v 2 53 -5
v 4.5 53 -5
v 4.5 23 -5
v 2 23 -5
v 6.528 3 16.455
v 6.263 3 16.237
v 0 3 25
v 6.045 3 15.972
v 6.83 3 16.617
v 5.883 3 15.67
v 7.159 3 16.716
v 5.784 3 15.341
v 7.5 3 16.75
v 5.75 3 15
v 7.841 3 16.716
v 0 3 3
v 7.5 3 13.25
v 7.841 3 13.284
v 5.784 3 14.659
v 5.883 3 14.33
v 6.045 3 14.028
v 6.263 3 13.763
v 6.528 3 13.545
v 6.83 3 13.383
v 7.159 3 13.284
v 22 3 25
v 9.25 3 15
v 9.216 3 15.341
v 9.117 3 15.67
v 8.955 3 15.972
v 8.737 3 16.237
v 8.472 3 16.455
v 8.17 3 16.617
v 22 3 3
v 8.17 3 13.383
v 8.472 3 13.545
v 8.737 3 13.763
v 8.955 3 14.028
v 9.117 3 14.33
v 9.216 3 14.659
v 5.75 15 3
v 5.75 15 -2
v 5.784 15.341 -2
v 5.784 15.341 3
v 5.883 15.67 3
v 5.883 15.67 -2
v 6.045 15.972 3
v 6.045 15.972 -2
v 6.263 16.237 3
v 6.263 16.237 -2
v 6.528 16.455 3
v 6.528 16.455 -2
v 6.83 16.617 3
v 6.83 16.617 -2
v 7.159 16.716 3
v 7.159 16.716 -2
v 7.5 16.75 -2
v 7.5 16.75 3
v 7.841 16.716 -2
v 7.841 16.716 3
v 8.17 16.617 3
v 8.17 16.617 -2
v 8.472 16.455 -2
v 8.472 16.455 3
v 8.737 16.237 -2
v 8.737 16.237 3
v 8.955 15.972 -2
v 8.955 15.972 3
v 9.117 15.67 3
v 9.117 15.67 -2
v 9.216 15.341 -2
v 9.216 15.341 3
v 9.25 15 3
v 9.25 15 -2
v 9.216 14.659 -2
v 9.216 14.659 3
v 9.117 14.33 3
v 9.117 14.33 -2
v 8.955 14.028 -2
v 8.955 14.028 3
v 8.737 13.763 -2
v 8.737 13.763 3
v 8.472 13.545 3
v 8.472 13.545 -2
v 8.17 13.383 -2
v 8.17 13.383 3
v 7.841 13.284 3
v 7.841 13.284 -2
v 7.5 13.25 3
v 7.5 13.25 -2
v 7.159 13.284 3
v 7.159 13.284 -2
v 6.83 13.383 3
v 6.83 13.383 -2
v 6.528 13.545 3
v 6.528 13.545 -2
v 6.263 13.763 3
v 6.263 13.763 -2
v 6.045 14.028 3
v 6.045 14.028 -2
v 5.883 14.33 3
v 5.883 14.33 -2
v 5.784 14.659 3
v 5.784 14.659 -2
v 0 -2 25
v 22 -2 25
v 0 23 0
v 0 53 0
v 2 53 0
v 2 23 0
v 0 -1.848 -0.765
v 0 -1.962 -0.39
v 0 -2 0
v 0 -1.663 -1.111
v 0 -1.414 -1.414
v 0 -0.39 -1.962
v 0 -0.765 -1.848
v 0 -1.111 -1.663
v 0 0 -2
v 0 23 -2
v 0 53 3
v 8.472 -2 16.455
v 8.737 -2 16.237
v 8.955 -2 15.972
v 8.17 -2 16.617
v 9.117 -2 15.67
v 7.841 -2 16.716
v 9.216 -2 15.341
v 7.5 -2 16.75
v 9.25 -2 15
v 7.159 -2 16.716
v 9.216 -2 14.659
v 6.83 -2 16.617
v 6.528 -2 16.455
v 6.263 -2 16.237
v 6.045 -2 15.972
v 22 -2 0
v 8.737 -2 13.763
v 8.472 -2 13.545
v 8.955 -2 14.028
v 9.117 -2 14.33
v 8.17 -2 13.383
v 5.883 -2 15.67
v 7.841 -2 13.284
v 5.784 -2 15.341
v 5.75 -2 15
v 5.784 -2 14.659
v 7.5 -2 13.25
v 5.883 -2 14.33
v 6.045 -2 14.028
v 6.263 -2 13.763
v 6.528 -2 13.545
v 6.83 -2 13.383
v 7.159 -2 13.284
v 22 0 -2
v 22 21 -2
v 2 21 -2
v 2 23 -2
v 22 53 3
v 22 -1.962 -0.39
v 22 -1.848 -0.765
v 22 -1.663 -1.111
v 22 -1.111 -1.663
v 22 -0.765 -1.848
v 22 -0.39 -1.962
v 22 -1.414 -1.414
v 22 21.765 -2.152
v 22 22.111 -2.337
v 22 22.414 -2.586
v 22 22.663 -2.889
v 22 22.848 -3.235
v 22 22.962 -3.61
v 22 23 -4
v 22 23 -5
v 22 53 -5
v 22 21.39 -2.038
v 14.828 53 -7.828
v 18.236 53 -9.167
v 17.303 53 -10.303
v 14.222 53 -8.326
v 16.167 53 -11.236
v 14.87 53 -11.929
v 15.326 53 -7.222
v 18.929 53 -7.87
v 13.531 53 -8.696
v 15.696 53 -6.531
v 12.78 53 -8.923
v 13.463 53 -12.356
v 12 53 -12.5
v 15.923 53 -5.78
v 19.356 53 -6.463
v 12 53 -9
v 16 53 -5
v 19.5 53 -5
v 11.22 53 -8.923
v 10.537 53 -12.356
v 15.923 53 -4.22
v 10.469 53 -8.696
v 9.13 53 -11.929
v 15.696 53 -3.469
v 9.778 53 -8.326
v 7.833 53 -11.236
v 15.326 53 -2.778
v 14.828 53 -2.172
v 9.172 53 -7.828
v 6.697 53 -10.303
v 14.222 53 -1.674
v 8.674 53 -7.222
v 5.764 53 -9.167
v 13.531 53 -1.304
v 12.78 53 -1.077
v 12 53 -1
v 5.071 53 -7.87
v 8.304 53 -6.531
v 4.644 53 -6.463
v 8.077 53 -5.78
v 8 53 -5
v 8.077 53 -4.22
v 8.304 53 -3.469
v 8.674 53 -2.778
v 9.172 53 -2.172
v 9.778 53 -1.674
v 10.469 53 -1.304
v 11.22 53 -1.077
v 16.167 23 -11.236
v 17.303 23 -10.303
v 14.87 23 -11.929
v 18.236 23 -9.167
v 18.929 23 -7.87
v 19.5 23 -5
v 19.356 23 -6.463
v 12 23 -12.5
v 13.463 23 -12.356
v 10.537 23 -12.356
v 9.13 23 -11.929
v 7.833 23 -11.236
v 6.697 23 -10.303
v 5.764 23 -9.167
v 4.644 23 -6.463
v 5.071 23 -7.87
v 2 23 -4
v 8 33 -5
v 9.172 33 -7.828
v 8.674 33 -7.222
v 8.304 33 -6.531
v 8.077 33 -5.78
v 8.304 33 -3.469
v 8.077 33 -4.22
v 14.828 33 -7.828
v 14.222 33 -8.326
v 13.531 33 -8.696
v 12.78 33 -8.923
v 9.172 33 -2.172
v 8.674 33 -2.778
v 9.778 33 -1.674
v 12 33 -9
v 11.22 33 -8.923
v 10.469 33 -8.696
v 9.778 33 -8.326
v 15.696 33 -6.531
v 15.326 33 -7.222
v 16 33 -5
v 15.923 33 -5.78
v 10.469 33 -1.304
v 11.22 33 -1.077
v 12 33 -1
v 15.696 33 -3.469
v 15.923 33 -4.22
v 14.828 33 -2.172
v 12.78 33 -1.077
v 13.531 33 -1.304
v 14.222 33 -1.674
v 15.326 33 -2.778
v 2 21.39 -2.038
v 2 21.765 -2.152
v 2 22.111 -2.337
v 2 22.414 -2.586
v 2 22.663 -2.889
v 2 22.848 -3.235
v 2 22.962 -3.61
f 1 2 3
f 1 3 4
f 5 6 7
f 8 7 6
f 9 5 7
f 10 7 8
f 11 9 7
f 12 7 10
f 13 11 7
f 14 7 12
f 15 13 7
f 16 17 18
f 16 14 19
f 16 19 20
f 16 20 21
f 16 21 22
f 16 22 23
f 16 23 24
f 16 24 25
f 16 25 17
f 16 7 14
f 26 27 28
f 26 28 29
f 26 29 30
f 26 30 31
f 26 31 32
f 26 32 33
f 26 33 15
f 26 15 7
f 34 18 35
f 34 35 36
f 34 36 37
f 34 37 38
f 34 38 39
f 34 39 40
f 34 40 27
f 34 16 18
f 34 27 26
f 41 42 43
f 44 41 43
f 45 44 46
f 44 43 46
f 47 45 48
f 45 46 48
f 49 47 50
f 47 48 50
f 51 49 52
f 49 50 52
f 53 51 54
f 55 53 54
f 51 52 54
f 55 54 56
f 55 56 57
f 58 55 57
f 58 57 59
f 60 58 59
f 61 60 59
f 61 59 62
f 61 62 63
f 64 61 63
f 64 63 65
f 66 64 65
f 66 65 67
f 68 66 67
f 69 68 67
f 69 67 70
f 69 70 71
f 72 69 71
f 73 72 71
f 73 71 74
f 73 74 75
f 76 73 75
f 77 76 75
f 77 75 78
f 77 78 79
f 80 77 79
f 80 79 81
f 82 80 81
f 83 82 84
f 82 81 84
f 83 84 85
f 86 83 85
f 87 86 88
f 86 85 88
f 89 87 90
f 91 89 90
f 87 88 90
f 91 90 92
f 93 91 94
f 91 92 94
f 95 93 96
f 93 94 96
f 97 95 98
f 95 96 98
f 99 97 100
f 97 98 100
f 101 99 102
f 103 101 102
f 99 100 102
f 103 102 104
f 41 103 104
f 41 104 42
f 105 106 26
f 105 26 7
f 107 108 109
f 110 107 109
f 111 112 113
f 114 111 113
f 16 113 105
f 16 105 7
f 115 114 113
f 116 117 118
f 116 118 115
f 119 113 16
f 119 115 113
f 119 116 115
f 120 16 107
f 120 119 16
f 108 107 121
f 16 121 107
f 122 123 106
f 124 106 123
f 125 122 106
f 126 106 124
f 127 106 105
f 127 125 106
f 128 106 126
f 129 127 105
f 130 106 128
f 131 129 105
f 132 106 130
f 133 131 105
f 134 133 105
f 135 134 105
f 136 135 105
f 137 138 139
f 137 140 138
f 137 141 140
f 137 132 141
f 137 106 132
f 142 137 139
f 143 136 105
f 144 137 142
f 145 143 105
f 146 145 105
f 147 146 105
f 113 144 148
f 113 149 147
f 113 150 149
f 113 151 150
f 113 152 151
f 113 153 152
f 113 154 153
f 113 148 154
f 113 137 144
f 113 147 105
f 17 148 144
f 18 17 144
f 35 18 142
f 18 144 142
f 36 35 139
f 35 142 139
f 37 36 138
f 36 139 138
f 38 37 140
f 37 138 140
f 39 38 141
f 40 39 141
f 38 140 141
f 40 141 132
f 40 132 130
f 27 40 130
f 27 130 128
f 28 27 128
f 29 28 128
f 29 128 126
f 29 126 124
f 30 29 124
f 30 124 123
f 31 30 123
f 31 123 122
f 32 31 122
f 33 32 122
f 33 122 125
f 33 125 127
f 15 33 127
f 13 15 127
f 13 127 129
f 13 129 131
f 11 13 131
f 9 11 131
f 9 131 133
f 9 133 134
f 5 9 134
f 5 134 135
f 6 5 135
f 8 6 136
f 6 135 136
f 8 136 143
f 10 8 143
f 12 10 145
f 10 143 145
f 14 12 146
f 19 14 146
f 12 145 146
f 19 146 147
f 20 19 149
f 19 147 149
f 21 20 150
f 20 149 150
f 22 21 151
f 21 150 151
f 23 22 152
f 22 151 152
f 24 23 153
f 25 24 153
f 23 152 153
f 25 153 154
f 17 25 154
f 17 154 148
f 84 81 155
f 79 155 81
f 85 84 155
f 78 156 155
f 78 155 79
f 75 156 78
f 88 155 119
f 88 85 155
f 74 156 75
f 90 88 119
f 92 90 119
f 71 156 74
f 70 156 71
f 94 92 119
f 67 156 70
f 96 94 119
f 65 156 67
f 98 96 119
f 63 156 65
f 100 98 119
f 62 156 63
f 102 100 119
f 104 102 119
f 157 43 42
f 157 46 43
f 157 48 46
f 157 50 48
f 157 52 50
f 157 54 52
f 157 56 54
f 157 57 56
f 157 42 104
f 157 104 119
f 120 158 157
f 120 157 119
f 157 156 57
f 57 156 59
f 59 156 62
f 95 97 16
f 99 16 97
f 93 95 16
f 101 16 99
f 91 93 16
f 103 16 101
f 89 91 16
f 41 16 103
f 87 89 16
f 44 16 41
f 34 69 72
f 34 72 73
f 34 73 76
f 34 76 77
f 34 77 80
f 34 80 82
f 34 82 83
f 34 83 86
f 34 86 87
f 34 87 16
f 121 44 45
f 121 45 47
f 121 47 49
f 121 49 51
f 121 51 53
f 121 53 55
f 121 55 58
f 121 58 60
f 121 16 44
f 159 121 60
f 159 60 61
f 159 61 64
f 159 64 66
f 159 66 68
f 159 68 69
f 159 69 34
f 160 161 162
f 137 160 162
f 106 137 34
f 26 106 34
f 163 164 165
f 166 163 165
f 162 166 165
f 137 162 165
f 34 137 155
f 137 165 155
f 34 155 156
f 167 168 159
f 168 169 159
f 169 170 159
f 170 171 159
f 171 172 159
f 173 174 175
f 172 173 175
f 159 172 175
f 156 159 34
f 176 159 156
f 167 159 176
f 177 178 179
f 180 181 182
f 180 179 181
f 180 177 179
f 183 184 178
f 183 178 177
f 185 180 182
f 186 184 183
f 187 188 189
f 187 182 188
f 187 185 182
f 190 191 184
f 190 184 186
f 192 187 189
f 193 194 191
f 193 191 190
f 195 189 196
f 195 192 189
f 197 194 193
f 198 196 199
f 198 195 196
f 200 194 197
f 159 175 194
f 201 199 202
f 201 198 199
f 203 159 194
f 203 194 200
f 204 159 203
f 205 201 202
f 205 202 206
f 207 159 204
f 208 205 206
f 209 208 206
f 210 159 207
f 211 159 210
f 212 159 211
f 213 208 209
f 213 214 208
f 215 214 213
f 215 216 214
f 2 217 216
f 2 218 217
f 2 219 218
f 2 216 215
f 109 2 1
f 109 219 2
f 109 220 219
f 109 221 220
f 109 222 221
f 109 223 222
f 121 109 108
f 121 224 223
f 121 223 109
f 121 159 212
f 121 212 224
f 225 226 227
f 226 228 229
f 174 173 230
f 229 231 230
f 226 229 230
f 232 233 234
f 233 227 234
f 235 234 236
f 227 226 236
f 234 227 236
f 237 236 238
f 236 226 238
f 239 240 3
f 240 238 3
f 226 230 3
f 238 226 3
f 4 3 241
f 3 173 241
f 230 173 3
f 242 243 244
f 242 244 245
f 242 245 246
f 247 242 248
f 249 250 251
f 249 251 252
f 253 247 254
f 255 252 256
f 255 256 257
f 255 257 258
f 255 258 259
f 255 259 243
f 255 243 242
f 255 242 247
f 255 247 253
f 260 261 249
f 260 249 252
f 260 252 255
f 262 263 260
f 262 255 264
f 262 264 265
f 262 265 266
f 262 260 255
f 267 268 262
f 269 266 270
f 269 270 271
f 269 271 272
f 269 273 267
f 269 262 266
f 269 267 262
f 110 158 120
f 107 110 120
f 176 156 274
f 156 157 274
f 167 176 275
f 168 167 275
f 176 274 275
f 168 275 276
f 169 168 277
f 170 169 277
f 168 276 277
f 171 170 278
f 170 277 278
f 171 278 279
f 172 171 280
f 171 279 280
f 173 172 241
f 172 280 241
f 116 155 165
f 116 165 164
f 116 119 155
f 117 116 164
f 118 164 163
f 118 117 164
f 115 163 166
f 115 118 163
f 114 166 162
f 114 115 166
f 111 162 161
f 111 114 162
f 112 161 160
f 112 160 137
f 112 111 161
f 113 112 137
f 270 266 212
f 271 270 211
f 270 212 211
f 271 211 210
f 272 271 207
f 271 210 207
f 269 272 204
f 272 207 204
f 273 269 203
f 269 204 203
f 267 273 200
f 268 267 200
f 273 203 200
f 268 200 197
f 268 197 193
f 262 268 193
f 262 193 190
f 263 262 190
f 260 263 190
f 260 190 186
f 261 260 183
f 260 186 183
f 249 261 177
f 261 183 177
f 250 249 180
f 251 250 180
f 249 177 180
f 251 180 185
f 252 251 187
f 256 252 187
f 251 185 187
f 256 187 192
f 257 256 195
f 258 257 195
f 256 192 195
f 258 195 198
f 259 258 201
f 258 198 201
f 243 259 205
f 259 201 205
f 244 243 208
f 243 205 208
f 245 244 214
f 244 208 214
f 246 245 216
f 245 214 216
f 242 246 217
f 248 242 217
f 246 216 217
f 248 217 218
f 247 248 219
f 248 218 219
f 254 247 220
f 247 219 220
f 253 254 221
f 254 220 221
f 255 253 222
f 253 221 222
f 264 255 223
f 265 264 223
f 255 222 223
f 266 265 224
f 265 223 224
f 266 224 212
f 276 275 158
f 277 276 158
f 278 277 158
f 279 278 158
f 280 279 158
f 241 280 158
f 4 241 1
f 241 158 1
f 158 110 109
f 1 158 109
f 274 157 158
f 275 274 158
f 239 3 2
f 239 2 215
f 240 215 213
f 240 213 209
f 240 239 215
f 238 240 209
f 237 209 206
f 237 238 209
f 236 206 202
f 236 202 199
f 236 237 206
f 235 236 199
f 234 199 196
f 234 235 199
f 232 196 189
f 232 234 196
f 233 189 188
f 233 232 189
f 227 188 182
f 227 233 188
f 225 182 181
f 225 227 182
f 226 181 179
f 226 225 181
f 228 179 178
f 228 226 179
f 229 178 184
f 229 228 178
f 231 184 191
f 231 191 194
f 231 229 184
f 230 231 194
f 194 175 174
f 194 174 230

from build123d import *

# Parameters (mm, degrees)
SKETCH1_W           = 22
SKETCH1_H           = 53
BOSS_EXTRUDE1_DEPTH = 3
SKETCH2_W           = 22
SKETCH2_H           = 3
BOSS_EXTRUDE2_DEPTH = 22
SKETCH3_R           = 1.75
CUT_EXTRUDE1_DEPTH  = 22
SKETCH4_R           = 1.75
CUT_EXTRUDE2_DEPTH  = 63.593929418
SKETCH5_W           = 20
SKETCH5_H           = 30
BOSS_EXTRUDE3_DEPTH = 5
BOSS_EXTRUDE4_DEPTH = 30
SKETCH7_R           = 4
CUT_EXTRUDE3_DEPTH  = 20
BOSS_EXTRUDE5_START = 1
SKETCH8_W           = 22
SKETCH8_H           = 23
SKETCH8_R           = 1.75
BOSS_EXTRUDE5_DEPTH = 1
BOSS_EXTRUDE6_START = 1
SKETCH9_W           = 22
SKETCH9_H           = 26
SKETCH9_R           = 1.75
BOSS_EXTRUDE6_DEPTH = 1
BOSS_EXTRUDE7_START = 1
SKETCH10_W          = 22
SKETCH10_H          = 26
SKETCH10_R          = 1.75
BOSS_EXTRUDE7_DEPTH = 1
BOSS_EXTRUDE8_START = 1
SKETCH11_W          = 22
SKETCH11_H          = 25
SKETCH11_R          = 1.75
BOSS_EXTRUDE8_DEPTH = 1
FILLET1_R           = 2
FILLET2_R           = 2


with BuildPart() as part:
    # Sketch1 → Boss-Extrude1 (new body)
    with BuildSketch(Plane.XY):
        with Locations((11, 26.5)):
            Rectangle(SKETCH1_W, SKETCH1_H)
    extrude(amount=BOSS_EXTRUDE1_DEPTH)

    # Sketch2 → Boss-Extrude2 (add)
    with BuildSketch(Plane.XY.offset(3)):
        with Locations((11, 1.5)):
            Rectangle(SKETCH2_W, SKETCH2_H)
    extrude(amount=BOSS_EXTRUDE2_DEPTH)

    # Sketch3 → Cut-Extrude1 (cut)
    with BuildSketch(Plane.XZ):
        with Locations(Location((7.5, 15, 0), (0, 0, 270))):
            Circle(SKETCH3_R)
    extrude(amount=-CUT_EXTRUDE1_DEPTH, mode=Mode.SUBTRACT)

    # Sketch4 → Cut-Extrude2 (cut, through all)
    with BuildSketch(Plane(origin=(0, 0, 0), x_dir=(-1, 0, 0), z_dir=(0, 0, -1))):
        with Locations((-7.5, 15)):
            Circle(SKETCH4_R)
    extrude(amount=-CUT_EXTRUDE2_DEPTH, mode=Mode.SUBTRACT)

    # Sketch5 → Boss-Extrude3 (add)
    with BuildSketch(Plane(origin=(0, 0, 0), x_dir=(-1, 0, 0), z_dir=(0, 0, -1))):
        with Locations((-12, 38)):
            Rectangle(SKETCH5_W, SKETCH5_H)
    extrude(amount=BOSS_EXTRUDE3_DEPTH)

    # Sketch6 → Boss-Extrude4 (add)
    with BuildSketch(Plane.XZ.offset(-23)):
        with BuildLine():
            Line((19.5, -5), (4.5, -5))
            ThreePointArc((4.5, -5), (12, -12.5), (19.5, -5))
        make_face()
    extrude(amount=-BOSS_EXTRUDE4_DEPTH)

    # Sketch7 → Cut-Extrude3 (cut)
    with BuildSketch(Plane(origin=(0, 53, 0), x_dir=(1, 0, 0), z_dir=(0, 1, 0))):
        with Locations(Location((12, 5, 0), (0, 0, 270))):
            Circle(SKETCH7_R)
    extrude(amount=-CUT_EXTRUDE3_DEPTH, mode=Mode.SUBTRACT)

    # Sketch8 → Boss-Extrude5 (add)
    with BuildSketch(Plane(origin=(0, 0, 0), x_dir=(-1, 0, 0), z_dir=(0, 0, -1)).offset(BOSS_EXTRUDE5_START)):
        with Locations((-11, 11.5)):
            Rectangle(SKETCH8_W, SKETCH8_H)
        with Locations((-7.5, 15)):
            Circle(SKETCH8_R, mode=Mode.SUBTRACT)
    extrude(amount=-BOSS_EXTRUDE5_DEPTH)

    # Sketch9 → Boss-Extrude6 (add)
    with BuildSketch(Plane.XZ.offset(BOSS_EXTRUDE6_START)):
        with Locations((11, 12)):
            Rectangle(SKETCH9_W, SKETCH9_H)
        with Locations(Location((7.5, 15, 0), (0, 0, 270))):
            Circle(SKETCH9_R, mode=Mode.SUBTRACT)
    extrude(amount=-BOSS_EXTRUDE6_DEPTH)

    # Sketch10 → Boss-Extrude7 (add)
    with BuildSketch(Plane(origin=(0, -1, 0), x_dir=(-1, 0, 0), z_dir=(0, -1, 0)).offset(BOSS_EXTRUDE7_START)):
        with Locations((-11, -12)):
            Rectangle(SKETCH10_W, SKETCH10_H)
        with Locations(Location((-7.5, -15, 0), (0, 0, 90))):
            Circle(SKETCH10_R, mode=Mode.SUBTRACT)
    extrude(amount=-BOSS_EXTRUDE7_DEPTH)

    # Sketch11 → Boss-Extrude8 (add)
    with BuildSketch(Plane(origin=(0, 0, -1), x_dir=(-1, 0, 0), z_dir=(0, 0, -1)).offset(BOSS_EXTRUDE8_START)):
        with Locations((-11, 10.5)):
            Rectangle(SKETCH11_W, SKETCH11_H)
        with Locations((-7.5, 15)):
            Circle(SKETCH11_R, mode=Mode.SUBTRACT)
    extrude(amount=-BOSS_EXTRUDE8_DEPTH)

    # Fillet1
    fillet1_edges = [part.edges().sort_by_distance(p)[0] for p in [
        (11, -2, -2),
    ]]
    fillet(fillet1_edges, radius=FILLET1_R)

    # Fillet2
    fillet2_edges = [part.edges().sort_by_distance(p)[0] for p in [
        (12, 23, -2),
    ]]
    fillet(fillet2_edges, radius=FILLET2_R)


solid = part.part
